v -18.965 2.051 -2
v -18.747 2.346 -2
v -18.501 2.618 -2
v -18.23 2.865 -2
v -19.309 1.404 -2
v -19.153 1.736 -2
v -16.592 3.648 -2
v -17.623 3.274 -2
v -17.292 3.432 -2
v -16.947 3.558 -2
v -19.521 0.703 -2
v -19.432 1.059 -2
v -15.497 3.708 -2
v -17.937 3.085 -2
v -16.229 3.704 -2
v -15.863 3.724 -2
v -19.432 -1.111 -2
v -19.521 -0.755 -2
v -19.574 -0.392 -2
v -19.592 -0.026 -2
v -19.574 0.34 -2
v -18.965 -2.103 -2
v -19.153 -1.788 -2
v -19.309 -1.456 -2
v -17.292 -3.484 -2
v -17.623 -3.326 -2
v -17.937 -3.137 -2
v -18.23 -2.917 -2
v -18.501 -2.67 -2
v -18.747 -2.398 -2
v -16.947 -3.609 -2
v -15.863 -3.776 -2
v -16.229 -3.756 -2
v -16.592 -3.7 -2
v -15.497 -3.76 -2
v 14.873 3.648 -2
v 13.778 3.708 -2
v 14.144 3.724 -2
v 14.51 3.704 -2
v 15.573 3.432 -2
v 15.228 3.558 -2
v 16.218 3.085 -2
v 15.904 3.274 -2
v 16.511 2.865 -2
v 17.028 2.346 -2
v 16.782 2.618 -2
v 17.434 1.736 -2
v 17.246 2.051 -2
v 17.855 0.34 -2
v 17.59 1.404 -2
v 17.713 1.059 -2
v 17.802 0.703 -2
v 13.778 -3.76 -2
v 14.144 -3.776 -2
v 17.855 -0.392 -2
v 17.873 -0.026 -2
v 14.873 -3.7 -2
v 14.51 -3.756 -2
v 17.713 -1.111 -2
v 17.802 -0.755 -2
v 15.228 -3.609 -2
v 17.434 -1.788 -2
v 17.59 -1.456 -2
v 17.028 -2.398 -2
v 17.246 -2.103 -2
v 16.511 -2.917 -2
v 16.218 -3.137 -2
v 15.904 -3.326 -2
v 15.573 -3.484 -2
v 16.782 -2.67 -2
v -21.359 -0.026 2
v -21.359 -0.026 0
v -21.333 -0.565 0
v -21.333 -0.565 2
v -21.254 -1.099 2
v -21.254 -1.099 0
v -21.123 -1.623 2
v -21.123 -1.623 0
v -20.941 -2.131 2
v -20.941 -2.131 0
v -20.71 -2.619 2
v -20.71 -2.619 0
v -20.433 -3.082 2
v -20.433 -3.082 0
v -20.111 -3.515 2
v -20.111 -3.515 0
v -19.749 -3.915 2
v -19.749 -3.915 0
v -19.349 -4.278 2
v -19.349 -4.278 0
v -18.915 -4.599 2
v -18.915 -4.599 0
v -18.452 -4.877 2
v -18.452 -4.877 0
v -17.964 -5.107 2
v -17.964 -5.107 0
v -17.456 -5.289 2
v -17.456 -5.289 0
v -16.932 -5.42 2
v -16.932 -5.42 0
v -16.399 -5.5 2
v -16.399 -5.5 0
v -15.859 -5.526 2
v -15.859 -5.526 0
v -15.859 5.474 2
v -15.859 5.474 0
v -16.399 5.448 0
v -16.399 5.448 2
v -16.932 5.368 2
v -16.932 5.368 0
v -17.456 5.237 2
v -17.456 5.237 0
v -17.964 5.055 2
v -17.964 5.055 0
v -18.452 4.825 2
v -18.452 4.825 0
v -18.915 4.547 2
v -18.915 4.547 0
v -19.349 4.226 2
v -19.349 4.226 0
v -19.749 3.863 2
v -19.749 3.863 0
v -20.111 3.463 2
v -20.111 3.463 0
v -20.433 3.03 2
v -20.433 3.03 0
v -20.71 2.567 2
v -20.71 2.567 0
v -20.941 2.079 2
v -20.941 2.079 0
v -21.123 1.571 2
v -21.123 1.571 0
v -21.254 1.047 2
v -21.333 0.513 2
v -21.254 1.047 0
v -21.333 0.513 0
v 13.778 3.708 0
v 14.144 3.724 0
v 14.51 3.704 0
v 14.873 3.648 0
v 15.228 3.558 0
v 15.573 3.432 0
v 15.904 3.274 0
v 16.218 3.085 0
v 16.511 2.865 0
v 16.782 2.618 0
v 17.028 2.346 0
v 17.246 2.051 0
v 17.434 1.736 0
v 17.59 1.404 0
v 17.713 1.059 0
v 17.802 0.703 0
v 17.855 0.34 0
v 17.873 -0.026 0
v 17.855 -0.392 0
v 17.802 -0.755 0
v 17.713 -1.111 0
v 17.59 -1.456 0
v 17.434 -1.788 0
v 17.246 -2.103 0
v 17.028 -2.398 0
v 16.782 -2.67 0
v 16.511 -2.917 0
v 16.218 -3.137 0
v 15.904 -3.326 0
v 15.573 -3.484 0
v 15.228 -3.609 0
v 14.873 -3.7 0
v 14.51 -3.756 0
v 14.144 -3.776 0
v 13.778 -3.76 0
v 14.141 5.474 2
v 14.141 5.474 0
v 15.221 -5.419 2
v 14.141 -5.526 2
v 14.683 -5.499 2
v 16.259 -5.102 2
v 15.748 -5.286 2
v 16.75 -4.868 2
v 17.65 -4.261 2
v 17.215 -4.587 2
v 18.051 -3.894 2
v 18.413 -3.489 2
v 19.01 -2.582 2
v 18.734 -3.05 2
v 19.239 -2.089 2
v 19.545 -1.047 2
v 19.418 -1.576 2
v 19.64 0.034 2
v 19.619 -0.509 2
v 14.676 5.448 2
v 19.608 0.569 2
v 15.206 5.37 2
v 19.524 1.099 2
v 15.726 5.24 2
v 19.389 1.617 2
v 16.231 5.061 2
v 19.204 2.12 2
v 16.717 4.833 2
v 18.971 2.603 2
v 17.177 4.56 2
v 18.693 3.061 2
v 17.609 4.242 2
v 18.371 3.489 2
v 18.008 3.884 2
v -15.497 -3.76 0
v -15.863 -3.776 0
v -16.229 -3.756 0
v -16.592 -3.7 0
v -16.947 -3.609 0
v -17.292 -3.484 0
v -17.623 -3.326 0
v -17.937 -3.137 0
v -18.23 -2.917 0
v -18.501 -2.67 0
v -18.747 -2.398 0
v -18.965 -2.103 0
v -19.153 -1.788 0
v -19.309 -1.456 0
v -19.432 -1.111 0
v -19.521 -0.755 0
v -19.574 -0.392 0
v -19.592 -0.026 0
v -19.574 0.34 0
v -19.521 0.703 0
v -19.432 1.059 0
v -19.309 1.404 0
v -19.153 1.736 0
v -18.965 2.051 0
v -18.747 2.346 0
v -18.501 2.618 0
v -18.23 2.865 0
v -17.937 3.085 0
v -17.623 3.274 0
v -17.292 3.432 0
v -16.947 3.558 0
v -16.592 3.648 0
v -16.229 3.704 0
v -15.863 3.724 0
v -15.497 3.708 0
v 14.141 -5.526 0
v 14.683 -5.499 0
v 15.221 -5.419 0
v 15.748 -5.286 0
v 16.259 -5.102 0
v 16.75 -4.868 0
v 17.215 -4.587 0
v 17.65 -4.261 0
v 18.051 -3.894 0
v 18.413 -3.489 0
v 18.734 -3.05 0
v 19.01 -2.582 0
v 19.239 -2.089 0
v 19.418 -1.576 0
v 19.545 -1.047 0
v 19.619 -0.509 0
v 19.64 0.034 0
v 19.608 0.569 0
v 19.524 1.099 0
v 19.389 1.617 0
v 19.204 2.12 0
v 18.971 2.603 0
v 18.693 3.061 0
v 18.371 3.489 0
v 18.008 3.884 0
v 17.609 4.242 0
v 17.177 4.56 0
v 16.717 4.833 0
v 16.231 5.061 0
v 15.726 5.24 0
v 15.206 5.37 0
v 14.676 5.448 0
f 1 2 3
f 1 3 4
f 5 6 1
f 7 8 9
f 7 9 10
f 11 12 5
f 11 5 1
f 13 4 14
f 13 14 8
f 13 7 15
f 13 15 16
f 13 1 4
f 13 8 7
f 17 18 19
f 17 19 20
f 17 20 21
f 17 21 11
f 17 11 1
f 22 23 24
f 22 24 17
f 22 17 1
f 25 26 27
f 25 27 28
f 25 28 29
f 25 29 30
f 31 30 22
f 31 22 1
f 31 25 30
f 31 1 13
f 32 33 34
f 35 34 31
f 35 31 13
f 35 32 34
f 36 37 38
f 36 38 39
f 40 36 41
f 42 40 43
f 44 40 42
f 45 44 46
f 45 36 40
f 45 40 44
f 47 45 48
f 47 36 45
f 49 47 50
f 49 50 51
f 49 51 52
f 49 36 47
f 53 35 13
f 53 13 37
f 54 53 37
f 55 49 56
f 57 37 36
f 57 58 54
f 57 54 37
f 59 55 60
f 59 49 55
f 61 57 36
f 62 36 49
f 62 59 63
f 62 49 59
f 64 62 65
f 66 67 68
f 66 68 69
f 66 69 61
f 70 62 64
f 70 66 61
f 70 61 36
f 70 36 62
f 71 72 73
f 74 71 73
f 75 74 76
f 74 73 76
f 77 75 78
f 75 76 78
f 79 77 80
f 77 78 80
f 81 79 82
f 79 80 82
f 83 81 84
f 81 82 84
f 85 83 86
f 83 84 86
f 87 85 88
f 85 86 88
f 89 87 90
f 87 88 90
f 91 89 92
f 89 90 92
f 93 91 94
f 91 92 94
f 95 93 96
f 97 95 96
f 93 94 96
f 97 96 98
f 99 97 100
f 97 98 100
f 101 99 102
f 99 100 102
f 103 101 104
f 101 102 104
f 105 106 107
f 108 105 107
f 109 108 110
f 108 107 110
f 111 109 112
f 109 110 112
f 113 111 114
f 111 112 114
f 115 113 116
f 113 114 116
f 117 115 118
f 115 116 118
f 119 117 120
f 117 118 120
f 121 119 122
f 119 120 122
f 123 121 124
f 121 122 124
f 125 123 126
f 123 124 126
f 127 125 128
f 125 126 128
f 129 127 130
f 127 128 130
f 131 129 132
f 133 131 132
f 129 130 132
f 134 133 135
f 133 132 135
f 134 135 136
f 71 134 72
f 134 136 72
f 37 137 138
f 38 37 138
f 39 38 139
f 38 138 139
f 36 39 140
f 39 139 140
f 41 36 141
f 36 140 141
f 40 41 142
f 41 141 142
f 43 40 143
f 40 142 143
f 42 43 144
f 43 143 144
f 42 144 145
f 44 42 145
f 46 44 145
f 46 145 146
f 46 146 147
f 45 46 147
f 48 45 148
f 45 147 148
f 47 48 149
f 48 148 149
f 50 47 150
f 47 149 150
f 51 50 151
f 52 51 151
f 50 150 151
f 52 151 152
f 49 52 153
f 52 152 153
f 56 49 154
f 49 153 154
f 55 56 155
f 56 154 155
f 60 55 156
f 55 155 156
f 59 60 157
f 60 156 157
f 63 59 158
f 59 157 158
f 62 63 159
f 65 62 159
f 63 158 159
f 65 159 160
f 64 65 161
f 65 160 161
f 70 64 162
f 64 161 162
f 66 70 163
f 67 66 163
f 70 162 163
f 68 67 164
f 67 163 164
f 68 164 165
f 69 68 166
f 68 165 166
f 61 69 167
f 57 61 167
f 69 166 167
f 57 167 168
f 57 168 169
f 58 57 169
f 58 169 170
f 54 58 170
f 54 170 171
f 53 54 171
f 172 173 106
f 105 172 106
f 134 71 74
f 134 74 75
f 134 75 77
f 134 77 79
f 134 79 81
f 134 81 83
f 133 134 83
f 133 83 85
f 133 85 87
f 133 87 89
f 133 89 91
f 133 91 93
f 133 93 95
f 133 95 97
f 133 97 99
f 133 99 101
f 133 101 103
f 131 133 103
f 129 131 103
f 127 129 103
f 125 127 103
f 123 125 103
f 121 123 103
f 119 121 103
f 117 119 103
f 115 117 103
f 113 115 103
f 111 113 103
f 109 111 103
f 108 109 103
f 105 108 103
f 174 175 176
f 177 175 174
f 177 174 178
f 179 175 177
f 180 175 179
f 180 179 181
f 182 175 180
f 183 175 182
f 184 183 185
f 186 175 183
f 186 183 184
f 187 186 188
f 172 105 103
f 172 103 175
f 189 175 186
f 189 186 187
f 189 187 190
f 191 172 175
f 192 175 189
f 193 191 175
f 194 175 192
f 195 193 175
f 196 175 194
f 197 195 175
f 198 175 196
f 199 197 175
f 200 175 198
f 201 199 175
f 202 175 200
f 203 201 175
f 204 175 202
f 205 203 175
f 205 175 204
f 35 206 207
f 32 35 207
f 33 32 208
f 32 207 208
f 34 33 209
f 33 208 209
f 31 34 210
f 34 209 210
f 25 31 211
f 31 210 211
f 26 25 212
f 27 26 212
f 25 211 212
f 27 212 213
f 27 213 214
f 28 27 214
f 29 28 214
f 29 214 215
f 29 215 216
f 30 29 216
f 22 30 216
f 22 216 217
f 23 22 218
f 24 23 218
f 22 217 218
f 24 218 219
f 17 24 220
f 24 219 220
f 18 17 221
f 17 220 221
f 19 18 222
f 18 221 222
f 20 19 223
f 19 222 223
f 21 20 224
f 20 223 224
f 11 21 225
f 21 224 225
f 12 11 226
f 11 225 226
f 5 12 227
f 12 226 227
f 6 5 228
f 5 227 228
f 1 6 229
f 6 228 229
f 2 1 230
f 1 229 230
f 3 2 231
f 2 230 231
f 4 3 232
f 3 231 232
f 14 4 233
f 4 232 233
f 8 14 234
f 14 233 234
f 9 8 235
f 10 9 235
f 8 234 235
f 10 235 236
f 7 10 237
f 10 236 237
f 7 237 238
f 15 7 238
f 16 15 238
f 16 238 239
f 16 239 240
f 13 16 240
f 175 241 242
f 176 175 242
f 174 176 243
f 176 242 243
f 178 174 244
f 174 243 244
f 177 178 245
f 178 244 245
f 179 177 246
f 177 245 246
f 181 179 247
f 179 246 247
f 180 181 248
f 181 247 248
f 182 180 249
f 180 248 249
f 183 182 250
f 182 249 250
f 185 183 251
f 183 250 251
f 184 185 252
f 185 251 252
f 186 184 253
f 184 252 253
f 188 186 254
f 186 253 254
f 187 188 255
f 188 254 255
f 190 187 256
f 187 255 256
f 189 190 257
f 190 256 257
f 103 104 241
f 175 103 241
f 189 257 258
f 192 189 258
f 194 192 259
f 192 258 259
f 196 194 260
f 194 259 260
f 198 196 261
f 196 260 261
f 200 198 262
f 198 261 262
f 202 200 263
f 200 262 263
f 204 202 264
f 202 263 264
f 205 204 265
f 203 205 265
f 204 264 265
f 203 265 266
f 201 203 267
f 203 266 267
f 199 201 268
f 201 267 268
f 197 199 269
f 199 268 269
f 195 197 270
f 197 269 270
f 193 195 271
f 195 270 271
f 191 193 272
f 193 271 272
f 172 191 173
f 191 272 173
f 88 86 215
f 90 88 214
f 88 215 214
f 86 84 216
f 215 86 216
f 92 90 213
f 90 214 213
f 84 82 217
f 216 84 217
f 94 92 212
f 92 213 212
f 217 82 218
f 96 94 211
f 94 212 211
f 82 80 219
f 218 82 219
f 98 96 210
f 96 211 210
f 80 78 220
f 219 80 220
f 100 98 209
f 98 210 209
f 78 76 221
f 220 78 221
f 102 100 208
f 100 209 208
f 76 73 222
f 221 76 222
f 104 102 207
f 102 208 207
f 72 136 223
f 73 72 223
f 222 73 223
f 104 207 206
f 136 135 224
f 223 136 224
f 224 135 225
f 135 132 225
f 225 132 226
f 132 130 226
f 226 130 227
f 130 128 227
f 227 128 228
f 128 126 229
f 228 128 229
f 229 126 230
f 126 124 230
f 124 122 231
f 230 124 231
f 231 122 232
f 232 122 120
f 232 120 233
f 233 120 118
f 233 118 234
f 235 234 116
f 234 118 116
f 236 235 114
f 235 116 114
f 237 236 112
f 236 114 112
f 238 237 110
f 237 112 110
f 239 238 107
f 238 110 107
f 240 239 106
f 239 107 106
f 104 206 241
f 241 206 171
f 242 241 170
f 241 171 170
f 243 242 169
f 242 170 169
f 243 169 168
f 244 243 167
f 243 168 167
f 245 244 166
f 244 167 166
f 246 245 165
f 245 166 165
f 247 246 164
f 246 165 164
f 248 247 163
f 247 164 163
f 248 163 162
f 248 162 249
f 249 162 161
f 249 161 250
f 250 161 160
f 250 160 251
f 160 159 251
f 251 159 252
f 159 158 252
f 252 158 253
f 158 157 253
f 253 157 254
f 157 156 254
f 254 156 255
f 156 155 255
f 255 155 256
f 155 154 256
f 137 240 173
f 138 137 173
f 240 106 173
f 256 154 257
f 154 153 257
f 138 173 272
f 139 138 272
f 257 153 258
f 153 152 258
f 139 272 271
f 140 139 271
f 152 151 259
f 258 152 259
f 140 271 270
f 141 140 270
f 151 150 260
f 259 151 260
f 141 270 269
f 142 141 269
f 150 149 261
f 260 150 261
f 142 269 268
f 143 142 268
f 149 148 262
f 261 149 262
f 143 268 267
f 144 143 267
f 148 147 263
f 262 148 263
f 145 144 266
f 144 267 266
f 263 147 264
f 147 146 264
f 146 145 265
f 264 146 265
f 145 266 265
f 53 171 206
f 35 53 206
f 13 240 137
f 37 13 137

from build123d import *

# Parameters (mm, degrees)
F1_DEPTH = 2
F3_DEPTH = 2


with BuildPart() as f1:
    # F0 (on Top) → F1 (new body)
    with BuildSketch(Plane.XY):
        with BuildLine():
            ThreePointArc((19.640177, 0.03416), (18.008268, 3.884303), (14.140506, 5.474007))
            Line((14.140506, 5.474007), (-15.859494, 5.474007))
            ThreePointArc((-15.859494, 5.474007), (-19.748581, 3.863094), (-21.359494, -0.025993))
            ThreePointArc((-21.359494, -0.025993), (-19.748581, -3.915081), (-15.859494, -5.525993))
            Line((-15.859494, -5.525993), (14.140506, -5.525993))
            ThreePointArc((14.140506, -5.525993), (18.050803, -3.893755), (19.640177, 0.03416))
        make_face()
    extrude(amount=F1_DEPTH)

    # F2 (on face) → F3 (join)
    with BuildSketch(Plane(origin=(0, 0, 0), x_dir=(1, 0, 0), z_dir=(0, 0, -1))):
        with BuildLine():
            Line((13.778, 3.760071), (-15.496988, 3.760071))
            ThreePointArc((-15.496988, 3.760071), (-19.592193, 0.025993), (-15.496988, -3.708084))
            Line((-15.496988, -3.708084), (13.778, -3.708084))
            ThreePointArc((13.778, -3.708084), (17.873205, 0.025993), (13.778, 3.760071))
        make_face()
    extrude(amount=F3_DEPTH)


solid = f1.part
